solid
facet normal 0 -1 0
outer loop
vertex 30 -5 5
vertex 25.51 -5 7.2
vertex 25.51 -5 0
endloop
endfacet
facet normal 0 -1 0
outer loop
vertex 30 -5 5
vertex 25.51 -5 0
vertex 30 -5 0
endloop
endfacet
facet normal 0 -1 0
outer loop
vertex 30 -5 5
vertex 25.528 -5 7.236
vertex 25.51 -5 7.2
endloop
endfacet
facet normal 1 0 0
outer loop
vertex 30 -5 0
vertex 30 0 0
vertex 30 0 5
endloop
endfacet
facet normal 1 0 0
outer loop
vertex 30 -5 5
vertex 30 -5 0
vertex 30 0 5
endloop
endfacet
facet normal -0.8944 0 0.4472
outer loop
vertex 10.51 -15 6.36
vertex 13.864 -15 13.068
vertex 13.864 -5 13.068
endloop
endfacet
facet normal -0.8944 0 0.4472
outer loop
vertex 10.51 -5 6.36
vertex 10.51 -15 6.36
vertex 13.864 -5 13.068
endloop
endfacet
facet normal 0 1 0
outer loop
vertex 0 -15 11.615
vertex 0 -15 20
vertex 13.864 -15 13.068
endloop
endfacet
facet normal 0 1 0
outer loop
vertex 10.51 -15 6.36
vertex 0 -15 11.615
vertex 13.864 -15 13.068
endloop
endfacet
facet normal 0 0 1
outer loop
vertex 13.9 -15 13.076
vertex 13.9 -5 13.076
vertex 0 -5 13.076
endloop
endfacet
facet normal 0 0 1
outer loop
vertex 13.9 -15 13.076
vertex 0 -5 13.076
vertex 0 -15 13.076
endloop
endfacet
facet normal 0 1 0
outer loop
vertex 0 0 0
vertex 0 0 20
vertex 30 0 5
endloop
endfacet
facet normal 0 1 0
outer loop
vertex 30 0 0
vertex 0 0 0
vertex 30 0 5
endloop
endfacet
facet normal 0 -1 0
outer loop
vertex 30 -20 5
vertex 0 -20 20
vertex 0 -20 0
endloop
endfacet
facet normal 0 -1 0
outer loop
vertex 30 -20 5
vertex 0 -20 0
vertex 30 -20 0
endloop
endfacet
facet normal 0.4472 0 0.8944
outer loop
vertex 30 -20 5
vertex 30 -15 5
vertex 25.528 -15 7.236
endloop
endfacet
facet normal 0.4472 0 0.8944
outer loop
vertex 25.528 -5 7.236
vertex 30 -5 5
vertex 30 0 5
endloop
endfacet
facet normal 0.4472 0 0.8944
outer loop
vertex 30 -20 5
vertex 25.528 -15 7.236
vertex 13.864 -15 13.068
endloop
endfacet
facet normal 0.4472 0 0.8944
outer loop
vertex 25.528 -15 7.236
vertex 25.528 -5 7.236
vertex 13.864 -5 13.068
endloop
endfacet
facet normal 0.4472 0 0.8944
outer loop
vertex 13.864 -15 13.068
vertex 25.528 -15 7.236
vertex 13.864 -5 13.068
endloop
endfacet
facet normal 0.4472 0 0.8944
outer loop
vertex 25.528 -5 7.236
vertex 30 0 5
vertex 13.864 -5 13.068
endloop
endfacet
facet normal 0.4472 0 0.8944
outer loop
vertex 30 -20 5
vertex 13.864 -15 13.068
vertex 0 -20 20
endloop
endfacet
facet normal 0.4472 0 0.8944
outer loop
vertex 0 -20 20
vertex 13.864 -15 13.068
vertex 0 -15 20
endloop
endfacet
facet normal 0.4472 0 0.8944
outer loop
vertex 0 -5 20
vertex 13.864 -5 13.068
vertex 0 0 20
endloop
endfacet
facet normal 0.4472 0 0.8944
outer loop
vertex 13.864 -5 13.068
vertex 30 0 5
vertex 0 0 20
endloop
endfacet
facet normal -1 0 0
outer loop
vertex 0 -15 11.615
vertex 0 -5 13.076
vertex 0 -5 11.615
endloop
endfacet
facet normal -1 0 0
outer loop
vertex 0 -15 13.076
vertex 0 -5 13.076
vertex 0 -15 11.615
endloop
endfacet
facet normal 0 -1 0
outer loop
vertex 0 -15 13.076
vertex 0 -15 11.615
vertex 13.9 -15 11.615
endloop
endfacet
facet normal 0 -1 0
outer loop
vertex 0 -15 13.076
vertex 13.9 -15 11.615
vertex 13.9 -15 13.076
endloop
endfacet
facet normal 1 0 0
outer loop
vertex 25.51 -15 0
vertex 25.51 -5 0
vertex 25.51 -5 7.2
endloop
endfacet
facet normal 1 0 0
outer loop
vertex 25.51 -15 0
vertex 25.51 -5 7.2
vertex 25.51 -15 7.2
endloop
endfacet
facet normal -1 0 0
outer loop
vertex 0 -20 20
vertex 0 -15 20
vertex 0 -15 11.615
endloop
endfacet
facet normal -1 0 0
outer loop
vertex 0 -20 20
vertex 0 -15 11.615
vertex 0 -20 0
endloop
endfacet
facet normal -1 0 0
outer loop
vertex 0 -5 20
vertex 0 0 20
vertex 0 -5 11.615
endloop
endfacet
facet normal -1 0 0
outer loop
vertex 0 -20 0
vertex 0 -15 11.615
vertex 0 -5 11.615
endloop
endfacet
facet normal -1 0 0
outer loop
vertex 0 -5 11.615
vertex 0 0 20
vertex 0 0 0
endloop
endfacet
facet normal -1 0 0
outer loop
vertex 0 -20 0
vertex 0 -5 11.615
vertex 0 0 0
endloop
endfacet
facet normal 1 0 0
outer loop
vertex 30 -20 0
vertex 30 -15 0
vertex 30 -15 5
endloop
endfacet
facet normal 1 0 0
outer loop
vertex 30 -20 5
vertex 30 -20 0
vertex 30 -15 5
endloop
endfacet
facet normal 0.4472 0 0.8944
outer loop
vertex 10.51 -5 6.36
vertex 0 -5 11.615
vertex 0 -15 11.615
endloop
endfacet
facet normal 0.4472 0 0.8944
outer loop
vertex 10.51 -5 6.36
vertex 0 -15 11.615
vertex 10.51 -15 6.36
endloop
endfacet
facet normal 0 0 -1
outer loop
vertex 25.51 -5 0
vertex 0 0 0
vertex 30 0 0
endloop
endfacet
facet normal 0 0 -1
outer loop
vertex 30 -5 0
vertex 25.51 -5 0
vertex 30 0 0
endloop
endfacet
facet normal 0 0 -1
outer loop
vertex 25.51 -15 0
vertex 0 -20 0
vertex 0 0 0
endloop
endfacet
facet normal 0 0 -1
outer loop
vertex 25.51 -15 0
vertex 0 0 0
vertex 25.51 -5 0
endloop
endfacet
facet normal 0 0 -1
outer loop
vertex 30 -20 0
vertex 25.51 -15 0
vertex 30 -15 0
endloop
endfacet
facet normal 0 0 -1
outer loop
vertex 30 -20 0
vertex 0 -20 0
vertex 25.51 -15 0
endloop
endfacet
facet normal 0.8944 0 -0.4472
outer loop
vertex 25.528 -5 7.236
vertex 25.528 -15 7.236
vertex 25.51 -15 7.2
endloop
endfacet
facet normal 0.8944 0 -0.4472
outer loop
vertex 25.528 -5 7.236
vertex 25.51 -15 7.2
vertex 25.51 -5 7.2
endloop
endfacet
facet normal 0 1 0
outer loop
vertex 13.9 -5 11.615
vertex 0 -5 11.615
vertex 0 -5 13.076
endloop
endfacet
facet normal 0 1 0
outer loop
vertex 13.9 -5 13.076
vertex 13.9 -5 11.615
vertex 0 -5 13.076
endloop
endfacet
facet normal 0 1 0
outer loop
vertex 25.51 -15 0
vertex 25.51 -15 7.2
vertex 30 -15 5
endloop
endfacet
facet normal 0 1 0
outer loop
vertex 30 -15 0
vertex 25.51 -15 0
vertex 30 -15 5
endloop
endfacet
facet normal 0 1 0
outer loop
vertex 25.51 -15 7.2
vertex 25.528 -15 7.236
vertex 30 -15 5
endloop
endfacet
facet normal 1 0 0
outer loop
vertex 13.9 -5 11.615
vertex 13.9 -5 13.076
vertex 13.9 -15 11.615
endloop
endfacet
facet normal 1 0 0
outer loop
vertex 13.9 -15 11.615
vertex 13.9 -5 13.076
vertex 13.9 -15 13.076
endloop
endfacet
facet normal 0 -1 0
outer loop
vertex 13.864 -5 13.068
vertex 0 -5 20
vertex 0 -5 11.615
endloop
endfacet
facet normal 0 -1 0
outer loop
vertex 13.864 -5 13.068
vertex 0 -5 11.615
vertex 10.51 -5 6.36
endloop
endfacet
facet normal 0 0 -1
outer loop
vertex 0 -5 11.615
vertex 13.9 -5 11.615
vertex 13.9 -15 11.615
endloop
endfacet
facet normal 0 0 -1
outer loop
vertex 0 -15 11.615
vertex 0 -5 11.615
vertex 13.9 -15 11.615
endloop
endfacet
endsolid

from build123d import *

# Parameters (mm, degrees)
F1_DEPTH  = 20
F2_W      = 10
F2_H      = 5
F3_DEPTH  = 5
F4_W      = 5
F4_H      = 10
F5_DEPTH  = 15
F6_W      = 15.5
F6_H      = 10
F7_DEPTH  = 7.5
F8_W      = 3.6006319447
F8_H      = 10
F9_DEPTH  = 7.2
F10_W     = 10
F10_H     = 1.4608040711
F11_DEPTH = 13.9


with BuildPart() as f1:
    # F0 (on Front) → F1 (new body)
    with BuildSketch(Plane.XZ):
        Polygon((0, 20), (0, 0), (30, 0), (30, 5), align=None)
    extrude(amount=F1_DEPTH)

    # F2 (on face) → F3 (cut)
    with BuildSketch(Plane.YZ.offset(30)):
        with Locations((-10, 2.5)):
            Rectangle(F2_W, F2_H)
    extrude(amount=-F3_DEPTH, mode=Mode.SUBTRACT)

    # F4 (on face) → F5 (cut)
    with BuildSketch(Plane(origin=(8, 0, 16), x_dir=(0.894427191, 0, -0.4472135955), z_dir=(0.4472135955, 0, 0.894427191))):
        with Locations((22.0967477525, -10)):
            Rectangle(F4_W, F4_H)
    extrude(amount=-F5_DEPTH, mode=Mode.SUBTRACT)

    # F6 (on face) → F7 (cut)
    with BuildSketch(Plane(origin=(8, 0, 16), x_dir=(0.894427191, 0, -0.4472135955), z_dir=(0.4472135955, 0, 0.894427191))):
        with Locations((-1.19427191, -10)):
            Rectangle(F6_W, F6_H)
    extrude(amount=-F7_DEPTH, mode=Mode.SUBTRACT)

    # F8 (on face) → F9 (join)
    with BuildSketch(Plane(origin=(0, 0, 0), x_dir=(1, 0, 0), z_dir=(0, 0, -1))):
        with Locations((23.7101460286, 10)):
            Rectangle(F8_W, F8_H)
    extrude(amount=-F9_DEPTH)


with BuildPart() as f11:
    # F10 (on face) → F11 (new body)
    with BuildSketch(Plane(origin=(0, 0, 0), x_dir=(0, -1, 0), z_dir=(-1, 0, 0))):
        with Locations((10, 12.3451471199)):
            Rectangle(F10_W, F10_H)
    extrude(amount=-F11_DEPTH)


solid = Compound([f1.part, f11.part])
